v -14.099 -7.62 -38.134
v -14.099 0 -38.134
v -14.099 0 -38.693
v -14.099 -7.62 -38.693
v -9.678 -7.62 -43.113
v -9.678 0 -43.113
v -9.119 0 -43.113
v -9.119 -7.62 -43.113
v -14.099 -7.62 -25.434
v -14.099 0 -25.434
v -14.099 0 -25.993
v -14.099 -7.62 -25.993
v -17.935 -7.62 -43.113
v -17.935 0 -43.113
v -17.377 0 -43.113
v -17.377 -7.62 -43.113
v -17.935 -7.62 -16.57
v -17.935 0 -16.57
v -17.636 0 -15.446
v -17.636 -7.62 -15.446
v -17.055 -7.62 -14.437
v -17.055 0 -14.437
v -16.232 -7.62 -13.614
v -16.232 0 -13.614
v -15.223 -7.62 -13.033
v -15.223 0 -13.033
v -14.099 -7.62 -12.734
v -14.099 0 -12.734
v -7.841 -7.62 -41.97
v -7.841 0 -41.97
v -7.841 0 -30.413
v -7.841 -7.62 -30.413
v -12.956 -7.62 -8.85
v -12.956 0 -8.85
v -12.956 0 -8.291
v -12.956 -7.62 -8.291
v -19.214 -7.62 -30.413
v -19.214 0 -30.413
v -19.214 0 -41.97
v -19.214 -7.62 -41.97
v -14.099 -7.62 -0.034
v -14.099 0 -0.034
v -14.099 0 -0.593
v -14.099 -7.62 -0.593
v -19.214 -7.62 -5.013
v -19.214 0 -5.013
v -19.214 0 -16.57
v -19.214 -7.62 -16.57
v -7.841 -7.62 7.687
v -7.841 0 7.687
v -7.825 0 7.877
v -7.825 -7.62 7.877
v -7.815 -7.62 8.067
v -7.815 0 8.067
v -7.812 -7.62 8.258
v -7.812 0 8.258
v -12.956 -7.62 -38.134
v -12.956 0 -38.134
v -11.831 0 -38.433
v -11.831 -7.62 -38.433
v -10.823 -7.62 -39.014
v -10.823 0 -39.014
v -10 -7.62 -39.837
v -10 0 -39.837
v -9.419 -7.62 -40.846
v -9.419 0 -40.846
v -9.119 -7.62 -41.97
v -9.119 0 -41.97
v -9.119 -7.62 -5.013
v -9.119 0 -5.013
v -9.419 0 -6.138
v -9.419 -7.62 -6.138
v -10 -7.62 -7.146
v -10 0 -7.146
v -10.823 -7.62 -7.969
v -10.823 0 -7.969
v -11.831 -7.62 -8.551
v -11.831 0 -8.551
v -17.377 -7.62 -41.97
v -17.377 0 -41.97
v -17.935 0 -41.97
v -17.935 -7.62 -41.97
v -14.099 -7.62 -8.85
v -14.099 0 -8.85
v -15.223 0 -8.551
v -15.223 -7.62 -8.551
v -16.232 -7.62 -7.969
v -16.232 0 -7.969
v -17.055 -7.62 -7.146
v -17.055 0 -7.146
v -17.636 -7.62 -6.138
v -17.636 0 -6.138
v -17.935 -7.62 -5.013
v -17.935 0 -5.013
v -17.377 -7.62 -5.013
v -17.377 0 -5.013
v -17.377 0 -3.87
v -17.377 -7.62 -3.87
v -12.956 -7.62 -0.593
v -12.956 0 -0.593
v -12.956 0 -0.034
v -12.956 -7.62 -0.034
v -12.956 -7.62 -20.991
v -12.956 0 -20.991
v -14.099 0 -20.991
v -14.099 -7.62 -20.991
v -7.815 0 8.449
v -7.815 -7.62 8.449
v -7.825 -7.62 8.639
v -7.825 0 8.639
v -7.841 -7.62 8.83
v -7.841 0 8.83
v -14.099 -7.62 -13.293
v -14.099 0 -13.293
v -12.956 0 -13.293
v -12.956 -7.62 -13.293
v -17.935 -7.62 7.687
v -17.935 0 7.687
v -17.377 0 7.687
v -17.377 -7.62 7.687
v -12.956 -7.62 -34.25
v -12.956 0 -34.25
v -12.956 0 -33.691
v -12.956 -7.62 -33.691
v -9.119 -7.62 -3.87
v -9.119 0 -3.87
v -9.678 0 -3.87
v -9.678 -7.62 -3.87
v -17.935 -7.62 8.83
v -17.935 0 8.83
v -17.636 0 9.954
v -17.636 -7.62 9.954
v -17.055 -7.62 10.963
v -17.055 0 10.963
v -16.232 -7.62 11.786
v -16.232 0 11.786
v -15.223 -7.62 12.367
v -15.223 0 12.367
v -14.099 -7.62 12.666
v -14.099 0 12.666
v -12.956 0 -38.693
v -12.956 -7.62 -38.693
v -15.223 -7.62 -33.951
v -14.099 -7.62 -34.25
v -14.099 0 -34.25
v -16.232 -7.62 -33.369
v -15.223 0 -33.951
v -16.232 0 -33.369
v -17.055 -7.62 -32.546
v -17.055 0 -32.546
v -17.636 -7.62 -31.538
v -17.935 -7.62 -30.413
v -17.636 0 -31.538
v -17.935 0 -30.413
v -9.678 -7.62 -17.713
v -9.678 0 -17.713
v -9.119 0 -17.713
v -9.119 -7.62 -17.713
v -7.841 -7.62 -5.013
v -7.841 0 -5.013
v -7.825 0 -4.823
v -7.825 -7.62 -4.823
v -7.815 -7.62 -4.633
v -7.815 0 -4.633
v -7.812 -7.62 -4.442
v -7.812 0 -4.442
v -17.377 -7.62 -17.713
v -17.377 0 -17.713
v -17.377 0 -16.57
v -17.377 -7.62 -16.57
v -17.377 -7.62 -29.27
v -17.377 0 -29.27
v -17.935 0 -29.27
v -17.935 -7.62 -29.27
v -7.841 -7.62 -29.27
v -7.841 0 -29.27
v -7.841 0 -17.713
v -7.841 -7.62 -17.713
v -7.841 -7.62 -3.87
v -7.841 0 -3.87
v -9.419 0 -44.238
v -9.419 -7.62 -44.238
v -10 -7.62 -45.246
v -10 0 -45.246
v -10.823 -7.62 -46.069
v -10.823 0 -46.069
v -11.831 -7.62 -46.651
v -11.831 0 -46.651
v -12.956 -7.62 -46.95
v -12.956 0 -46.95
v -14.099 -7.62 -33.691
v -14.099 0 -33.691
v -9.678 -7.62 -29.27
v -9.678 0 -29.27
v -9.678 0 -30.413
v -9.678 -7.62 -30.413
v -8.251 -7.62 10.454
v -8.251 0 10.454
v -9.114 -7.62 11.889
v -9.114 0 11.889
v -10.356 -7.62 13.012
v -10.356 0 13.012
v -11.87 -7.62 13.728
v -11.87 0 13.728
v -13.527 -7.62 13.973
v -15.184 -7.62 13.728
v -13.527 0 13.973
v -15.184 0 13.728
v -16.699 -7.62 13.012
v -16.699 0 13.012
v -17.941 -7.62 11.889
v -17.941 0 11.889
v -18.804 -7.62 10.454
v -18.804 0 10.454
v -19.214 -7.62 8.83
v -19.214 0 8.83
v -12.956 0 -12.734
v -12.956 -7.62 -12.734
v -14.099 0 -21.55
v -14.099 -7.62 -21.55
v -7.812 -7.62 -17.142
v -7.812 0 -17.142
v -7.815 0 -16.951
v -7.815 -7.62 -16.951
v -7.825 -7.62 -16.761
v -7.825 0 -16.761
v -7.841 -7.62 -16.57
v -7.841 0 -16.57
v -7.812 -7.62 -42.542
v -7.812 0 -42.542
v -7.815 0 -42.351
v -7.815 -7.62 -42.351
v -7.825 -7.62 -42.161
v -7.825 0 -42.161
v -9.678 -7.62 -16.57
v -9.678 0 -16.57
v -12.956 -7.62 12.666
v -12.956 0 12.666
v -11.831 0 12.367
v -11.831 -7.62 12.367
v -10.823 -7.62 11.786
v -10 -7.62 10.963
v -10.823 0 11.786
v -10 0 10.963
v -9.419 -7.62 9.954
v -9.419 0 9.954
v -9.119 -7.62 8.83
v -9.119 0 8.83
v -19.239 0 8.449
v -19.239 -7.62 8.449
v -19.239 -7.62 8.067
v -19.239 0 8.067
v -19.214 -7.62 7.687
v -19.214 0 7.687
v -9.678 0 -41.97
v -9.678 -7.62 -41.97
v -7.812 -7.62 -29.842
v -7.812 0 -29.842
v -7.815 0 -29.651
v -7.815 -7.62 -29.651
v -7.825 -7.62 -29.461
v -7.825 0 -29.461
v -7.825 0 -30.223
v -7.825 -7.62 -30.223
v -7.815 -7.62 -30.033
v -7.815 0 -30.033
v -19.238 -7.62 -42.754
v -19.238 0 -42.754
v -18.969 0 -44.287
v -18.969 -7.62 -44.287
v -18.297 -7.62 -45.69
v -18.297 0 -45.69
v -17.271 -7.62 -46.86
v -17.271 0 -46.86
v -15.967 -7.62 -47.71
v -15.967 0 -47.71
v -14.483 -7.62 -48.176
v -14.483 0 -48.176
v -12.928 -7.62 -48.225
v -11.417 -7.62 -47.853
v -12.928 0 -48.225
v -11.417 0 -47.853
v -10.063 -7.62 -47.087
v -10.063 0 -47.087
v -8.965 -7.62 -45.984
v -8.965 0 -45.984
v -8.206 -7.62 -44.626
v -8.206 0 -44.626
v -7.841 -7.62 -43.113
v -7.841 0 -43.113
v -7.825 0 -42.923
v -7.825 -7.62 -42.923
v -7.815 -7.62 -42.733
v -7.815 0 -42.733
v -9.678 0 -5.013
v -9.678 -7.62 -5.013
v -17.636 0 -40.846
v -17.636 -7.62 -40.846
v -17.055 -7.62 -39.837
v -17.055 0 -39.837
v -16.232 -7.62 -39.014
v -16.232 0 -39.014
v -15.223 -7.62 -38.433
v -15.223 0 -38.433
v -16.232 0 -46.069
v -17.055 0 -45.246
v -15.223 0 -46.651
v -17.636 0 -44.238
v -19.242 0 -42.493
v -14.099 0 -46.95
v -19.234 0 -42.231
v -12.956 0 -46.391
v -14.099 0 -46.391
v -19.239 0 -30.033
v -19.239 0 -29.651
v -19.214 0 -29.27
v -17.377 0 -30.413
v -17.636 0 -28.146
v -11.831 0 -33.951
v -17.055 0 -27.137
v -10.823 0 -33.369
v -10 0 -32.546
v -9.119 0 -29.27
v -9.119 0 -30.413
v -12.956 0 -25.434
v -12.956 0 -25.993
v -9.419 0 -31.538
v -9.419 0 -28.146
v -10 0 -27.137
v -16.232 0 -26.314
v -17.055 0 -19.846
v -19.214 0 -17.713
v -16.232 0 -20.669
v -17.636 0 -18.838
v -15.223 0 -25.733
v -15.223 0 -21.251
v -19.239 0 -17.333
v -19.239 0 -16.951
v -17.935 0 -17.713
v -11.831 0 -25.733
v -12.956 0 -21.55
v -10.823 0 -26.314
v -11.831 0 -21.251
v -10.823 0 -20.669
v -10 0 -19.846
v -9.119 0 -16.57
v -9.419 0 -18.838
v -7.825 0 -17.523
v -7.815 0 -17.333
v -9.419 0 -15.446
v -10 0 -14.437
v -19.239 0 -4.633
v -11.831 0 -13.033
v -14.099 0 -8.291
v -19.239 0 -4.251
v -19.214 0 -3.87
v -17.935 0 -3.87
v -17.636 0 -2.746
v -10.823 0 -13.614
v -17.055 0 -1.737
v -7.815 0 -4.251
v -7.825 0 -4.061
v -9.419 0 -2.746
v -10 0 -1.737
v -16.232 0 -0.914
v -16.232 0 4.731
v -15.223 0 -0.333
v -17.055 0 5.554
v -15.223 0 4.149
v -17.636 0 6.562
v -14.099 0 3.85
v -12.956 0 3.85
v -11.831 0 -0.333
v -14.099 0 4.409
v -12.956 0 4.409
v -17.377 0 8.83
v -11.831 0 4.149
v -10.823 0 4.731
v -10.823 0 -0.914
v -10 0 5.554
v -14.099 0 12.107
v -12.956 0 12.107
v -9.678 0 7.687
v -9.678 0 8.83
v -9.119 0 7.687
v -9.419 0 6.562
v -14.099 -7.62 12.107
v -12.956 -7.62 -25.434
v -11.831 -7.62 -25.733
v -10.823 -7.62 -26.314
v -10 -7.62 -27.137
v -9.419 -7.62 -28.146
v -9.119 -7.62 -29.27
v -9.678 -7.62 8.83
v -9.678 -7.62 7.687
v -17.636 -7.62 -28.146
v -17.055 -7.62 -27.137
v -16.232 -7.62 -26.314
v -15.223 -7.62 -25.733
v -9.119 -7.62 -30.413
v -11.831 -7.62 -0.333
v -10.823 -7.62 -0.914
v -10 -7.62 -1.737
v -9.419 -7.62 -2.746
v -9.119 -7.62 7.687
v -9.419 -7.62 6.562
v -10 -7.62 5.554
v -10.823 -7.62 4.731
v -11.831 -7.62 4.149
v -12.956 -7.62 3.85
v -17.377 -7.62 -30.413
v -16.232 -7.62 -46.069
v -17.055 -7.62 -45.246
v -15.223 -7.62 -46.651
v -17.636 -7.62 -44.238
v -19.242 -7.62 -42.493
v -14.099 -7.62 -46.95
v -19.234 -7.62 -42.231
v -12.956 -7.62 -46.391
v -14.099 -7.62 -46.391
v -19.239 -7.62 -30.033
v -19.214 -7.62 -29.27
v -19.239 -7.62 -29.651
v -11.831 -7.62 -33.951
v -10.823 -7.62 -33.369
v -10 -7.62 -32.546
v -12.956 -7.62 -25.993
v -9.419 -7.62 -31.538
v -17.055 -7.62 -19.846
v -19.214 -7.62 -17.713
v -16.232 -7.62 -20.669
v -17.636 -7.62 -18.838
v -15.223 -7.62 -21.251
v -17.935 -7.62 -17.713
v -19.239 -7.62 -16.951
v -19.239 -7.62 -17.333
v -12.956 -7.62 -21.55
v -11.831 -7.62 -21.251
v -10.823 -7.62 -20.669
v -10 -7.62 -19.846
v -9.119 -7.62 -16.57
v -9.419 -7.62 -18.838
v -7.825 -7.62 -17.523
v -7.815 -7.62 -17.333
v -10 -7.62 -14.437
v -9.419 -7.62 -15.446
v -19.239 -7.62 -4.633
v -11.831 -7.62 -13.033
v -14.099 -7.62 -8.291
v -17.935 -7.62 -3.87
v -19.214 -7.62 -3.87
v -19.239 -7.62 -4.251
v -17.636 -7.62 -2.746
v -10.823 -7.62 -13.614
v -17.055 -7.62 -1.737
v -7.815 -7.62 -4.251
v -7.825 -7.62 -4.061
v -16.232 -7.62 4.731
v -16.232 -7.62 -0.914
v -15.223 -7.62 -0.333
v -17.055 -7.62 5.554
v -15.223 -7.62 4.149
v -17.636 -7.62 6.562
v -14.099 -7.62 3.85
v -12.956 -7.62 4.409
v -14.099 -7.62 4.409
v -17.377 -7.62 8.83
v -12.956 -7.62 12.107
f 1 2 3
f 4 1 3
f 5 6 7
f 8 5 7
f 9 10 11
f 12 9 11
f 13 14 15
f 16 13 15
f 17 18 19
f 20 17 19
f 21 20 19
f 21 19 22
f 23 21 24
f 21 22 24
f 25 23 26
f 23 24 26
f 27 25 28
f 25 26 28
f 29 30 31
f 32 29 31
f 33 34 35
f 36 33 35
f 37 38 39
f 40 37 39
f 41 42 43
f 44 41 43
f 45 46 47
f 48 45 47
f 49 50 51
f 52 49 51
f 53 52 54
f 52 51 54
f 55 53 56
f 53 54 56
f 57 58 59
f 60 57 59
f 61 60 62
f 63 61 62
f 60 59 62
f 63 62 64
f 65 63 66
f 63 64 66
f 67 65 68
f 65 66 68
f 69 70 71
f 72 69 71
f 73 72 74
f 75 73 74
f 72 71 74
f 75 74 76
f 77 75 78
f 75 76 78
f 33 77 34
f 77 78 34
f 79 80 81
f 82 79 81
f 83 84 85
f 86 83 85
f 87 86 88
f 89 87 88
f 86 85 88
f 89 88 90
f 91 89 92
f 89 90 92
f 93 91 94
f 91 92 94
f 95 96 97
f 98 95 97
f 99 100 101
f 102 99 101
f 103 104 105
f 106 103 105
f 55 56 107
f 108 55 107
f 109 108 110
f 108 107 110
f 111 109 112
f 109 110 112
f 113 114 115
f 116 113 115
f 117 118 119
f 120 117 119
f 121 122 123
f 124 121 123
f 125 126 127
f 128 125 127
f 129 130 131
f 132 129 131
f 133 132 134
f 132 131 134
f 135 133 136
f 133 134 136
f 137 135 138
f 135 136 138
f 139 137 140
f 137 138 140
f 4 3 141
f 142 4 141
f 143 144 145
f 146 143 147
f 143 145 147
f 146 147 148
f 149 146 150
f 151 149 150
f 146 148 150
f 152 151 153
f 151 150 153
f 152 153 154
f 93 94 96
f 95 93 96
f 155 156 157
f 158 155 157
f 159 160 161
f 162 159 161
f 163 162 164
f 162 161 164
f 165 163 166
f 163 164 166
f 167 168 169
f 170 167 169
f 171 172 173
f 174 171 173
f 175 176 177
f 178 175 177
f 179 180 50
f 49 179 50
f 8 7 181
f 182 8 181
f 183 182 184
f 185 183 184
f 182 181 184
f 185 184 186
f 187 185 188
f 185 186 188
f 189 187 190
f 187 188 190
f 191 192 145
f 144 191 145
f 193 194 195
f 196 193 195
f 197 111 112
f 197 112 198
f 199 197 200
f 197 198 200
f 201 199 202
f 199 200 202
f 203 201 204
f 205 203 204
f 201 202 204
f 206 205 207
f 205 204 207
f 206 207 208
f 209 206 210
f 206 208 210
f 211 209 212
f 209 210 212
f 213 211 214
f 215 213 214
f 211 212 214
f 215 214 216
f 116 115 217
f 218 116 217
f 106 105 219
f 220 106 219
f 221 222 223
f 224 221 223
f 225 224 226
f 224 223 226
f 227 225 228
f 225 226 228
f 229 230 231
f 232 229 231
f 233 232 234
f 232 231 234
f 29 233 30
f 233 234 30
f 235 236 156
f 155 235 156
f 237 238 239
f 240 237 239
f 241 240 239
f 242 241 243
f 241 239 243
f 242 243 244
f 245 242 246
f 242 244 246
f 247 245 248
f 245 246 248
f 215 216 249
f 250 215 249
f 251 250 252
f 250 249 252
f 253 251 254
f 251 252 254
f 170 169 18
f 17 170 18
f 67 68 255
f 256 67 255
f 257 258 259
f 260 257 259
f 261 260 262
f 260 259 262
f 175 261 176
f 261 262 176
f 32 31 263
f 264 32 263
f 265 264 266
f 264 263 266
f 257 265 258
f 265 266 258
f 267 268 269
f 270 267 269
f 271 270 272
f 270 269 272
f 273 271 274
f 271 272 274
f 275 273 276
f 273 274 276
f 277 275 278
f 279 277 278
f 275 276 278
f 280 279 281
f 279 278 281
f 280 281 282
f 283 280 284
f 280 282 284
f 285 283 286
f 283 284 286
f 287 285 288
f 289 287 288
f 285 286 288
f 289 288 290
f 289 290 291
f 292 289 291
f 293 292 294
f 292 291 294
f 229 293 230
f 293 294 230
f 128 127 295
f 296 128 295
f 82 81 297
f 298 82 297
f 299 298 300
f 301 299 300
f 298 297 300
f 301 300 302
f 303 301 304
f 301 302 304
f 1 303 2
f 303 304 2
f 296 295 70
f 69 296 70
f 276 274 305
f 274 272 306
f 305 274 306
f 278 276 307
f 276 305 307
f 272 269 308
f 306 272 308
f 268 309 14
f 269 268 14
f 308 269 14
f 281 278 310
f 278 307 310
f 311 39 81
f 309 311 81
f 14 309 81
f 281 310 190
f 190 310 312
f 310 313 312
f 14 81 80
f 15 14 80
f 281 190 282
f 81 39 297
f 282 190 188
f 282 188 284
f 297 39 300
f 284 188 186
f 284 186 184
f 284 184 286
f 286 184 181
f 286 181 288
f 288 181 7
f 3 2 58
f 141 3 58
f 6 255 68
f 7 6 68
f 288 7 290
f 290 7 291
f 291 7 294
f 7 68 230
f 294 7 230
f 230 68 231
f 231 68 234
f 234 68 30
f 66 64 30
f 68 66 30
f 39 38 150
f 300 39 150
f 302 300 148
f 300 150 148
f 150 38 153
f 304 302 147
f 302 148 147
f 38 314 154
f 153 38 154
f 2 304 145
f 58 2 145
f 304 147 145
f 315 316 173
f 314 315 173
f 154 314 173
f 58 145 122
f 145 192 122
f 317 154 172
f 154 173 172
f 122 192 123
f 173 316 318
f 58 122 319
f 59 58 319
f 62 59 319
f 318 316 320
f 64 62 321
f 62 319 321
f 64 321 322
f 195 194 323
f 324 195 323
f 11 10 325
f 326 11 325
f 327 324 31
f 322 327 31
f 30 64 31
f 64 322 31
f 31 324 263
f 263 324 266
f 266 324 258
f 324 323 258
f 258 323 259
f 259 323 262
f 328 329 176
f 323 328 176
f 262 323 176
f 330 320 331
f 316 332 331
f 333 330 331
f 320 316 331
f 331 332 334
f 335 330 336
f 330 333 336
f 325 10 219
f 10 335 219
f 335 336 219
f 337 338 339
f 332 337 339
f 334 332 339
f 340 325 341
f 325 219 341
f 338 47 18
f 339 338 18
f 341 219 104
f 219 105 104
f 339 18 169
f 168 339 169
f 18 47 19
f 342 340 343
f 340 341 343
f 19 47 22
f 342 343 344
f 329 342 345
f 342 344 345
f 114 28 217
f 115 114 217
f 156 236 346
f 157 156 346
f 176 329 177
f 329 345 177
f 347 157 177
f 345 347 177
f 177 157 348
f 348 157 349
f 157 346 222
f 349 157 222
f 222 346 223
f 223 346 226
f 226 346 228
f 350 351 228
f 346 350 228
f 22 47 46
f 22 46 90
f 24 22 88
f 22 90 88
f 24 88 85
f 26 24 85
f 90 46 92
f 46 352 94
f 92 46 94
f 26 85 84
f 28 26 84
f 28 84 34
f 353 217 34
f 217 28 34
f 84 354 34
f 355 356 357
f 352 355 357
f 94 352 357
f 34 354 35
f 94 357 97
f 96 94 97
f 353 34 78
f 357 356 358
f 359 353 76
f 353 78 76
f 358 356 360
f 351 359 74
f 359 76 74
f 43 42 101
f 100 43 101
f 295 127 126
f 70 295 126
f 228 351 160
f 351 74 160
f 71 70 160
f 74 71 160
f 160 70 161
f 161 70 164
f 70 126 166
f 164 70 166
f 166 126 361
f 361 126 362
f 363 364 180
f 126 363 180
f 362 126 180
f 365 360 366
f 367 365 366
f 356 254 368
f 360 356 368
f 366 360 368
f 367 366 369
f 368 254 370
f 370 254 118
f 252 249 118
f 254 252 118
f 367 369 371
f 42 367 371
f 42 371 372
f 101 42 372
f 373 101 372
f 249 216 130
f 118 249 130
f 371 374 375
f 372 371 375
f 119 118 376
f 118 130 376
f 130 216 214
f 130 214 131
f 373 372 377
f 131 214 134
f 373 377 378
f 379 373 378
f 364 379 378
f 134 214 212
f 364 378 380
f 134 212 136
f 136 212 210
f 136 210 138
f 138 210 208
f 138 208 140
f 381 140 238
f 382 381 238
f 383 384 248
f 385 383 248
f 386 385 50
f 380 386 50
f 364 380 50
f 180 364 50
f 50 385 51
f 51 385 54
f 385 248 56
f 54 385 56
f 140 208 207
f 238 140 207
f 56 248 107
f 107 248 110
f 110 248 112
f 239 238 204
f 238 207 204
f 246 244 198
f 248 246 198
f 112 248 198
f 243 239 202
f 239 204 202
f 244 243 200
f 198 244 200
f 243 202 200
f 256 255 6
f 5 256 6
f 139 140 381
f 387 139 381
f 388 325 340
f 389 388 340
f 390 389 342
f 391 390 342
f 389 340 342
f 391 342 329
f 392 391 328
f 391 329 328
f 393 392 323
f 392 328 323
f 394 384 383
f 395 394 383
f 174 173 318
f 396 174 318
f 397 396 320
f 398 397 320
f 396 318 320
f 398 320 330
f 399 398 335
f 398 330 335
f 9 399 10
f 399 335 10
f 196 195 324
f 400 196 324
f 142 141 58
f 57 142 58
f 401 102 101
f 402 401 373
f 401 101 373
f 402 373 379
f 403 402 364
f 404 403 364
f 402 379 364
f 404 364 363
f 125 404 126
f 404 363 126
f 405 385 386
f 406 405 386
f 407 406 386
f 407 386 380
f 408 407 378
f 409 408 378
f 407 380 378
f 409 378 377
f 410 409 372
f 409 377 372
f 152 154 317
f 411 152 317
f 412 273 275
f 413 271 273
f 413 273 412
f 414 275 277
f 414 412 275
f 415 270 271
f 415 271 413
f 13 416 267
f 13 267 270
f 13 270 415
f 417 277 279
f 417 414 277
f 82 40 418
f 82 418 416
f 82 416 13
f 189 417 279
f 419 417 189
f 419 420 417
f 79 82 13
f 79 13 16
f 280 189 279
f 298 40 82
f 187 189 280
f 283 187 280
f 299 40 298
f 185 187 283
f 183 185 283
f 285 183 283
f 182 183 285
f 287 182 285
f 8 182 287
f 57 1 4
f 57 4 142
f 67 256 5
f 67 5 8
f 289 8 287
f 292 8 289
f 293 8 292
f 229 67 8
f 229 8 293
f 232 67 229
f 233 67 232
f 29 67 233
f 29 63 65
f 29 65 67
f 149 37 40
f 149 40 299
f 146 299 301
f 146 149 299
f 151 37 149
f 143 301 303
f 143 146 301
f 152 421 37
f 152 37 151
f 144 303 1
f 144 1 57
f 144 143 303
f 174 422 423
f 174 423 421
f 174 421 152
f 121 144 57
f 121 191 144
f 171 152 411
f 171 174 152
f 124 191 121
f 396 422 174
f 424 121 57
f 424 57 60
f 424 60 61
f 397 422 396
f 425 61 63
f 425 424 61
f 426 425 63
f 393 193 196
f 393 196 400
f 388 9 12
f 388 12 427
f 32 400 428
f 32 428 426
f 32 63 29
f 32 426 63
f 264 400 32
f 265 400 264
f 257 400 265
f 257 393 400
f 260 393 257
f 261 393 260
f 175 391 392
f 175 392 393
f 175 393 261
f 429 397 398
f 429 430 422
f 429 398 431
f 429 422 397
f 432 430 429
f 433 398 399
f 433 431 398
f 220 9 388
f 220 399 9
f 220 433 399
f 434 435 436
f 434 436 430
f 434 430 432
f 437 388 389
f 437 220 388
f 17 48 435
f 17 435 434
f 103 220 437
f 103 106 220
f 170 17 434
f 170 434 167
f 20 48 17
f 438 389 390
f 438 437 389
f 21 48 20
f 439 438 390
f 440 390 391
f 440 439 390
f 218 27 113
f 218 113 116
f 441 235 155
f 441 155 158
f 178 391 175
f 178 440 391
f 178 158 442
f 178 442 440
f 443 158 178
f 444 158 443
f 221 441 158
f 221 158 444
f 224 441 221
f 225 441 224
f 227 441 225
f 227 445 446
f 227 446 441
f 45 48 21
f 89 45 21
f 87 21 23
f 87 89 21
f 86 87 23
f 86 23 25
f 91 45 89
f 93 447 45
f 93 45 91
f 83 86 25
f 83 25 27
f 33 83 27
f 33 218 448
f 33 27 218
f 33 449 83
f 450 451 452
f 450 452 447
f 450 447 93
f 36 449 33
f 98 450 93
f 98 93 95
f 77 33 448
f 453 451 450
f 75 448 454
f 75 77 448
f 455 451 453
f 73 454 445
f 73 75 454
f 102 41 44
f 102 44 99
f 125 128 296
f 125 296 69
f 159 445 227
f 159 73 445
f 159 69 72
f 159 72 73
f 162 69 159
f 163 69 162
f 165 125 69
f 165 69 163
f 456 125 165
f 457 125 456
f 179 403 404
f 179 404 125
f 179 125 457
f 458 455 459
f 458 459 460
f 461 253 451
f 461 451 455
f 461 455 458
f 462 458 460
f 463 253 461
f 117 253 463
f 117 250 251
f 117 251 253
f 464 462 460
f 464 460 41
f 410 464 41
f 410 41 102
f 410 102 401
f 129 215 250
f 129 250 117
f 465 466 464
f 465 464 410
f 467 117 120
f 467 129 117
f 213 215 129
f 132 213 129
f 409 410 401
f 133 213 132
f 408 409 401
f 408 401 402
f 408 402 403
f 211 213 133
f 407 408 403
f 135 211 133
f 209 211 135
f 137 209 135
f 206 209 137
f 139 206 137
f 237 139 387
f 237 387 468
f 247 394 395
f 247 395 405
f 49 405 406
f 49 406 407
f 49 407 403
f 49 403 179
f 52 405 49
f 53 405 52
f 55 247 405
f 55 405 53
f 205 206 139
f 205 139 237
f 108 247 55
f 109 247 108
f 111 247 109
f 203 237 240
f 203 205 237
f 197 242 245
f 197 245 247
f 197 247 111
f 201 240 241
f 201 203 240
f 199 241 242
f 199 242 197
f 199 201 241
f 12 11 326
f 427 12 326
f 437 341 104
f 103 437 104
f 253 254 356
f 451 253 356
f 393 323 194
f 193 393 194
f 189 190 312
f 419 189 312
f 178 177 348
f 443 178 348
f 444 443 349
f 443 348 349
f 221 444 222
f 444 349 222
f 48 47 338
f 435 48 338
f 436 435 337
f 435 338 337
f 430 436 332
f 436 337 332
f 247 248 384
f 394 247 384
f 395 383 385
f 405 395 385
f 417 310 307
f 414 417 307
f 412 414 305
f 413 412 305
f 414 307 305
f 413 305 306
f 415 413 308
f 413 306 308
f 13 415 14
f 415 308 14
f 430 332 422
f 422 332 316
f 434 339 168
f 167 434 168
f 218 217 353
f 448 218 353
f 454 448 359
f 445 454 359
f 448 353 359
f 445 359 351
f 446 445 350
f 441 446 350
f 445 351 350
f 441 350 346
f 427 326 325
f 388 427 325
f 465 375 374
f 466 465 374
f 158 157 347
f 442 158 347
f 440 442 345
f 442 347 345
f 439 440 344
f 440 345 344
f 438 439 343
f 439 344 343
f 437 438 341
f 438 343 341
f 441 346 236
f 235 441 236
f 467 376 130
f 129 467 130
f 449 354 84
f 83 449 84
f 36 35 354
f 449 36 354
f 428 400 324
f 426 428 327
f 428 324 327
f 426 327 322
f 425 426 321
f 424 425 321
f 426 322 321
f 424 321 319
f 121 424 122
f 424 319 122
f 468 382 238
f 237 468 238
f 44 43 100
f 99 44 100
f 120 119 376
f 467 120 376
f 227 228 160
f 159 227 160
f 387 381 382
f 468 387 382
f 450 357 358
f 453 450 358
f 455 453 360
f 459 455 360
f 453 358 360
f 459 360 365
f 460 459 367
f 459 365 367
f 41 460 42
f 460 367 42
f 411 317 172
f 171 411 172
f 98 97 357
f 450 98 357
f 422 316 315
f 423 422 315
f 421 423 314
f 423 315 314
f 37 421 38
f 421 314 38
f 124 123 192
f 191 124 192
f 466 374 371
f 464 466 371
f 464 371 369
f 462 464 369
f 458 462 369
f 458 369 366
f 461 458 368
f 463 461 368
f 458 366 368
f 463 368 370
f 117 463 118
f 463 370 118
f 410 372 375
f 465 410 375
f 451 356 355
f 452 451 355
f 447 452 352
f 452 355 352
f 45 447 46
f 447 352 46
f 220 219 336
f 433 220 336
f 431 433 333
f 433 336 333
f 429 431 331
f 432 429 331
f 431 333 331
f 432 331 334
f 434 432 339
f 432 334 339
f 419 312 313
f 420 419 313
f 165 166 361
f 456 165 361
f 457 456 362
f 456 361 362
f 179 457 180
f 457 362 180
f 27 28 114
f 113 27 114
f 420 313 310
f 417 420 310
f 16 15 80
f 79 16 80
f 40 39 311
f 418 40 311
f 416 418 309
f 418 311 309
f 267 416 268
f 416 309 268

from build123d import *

# Parameters (mm, degrees)
F1_DEPTH = 7.62


with BuildPart() as f1:
    # F0 (on Front) → F1 (new body)
    with BuildSketch(Plane.XZ):
        with BuildLine():
            Line((-7.840858501, -16.5704088648), (-7.840858501, -5.0134088648))
            ThreePointArc((-7.840858501, -5.0134088648), (-13.5272117041, -10.1569088648), (-19.2135649071, -5.0134088648))
            Line((-19.2135649071, -5.0134088648), (-19.2135649071, -16.5704088648))
            ThreePointArc((-19.2135649071, -16.5704088648), (-13.5272117041, -11.4269088648), (-7.840858501, -16.5704088648))
        make_face()
        with BuildLine():
            Line((-7.840858501, -5.0134088648), (-7.840858501, -3.8704088648))
            ThreePointArc((-7.840858501, -3.8704088648), (-13.5272117041, 1.2730911352), (-19.2135649071, -3.8704088648))
            Line((-19.2135649071, -3.8704088648), (-19.2135649071, -5.0134088648))
            ThreePointArc((-19.2135649071, -5.0134088648), (-13.5272117041, -10.1569088648), (-7.840858501, -5.0134088648))
        make_face()
        with BuildLine():
            ThreePointArc((-9.1191040886, -3.8704088648), (-9.0914443888, -4.1555640997), (-9.0822117041, -4.4419088648))
            ThreePointArc((-9.0822117041, -4.4419088648), (-9.0914443888, -4.7282536299), (-9.1191040886, -5.0134088648))
            ThreePointArc((-9.1191040886, -5.0134088648), (-10.3841220617, -7.5849985072), (-12.9557117041, -8.8500164803))
            ThreePointArc((-12.9557117041, -8.8500164803), (-13.5272117041, -8.8869088648), (-14.0987117041, -8.8500164803))
            ThreePointArc((-14.0987117041, -8.8500164803), (-16.6703013465, -7.5849985072), (-17.9353193196, -5.0134088648))
            ThreePointArc((-17.9353193196, -5.0134088648), (-17.9722117041, -4.4419088648), (-17.9353193196, -3.8704088648))
            ThreePointArc((-17.9353193196, -3.8704088648), (-16.6703013465, -1.2988192224), (-14.0987117041, -0.0338012493))
            ThreePointArc((-14.0987117041, -0.0338012493), (-13.5272117041, 0.0030911352), (-12.9557117041, -0.0338012493))
            ThreePointArc((-12.9557117041, -0.0338012493), (-10.3841220617, -1.2988192224), (-9.1191040886, -3.8704088648))
        make_face(mode=Mode.SUBTRACT)
        with BuildLine():
            Line((-7.840858501, -41.9704088648), (-7.840858501, -30.4134088648))
            ThreePointArc((-7.840858501, -30.4134088648), (-13.5272117041, -35.5569088648), (-19.2135649071, -30.4134088648))
            Line((-19.2135649071, -30.4134088648), (-19.2135649071, -41.9704088648))
            ThreePointArc((-19.2135649071, -41.9704088648), (-13.5272117041, -36.8269088648), (-7.840858501, -41.9704088648))
        make_face()
        with BuildLine():
            Line((-7.840858501, -30.4134088648), (-7.840858501, -29.2704088648))
            ThreePointArc((-7.840858501, -29.2704088648), (-13.5272117041, -24.1269088648), (-19.2135649071, -29.2704088648))
            Line((-19.2135649071, -29.2704088648), (-19.2135649071, -30.4134088648))
            ThreePointArc((-19.2135649071, -30.4134088648), (-13.5272117041, -35.5569088648), (-7.840858501, -30.4134088648))
        make_face()
        with BuildLine():
            ThreePointArc((-9.1191040886, -29.2704088648), (-9.0914443888, -29.5555640997), (-9.0822117041, -29.8419088648))
            ThreePointArc((-9.0822117041, -29.8419088648), (-9.0914443888, -30.1282536299), (-9.1191040886, -30.4134088648))
            ThreePointArc((-9.1191040886, -30.4134088648), (-10.3841220617, -32.9849985072), (-12.9557117041, -34.2500164803))
            ThreePointArc((-12.9557117041, -34.2500164803), (-13.5272117041, -34.2869088648), (-14.0987117041, -34.2500164803))
            ThreePointArc((-14.0987117041, -34.2500164803), (-16.6703013465, -32.9849985072), (-17.9353193196, -30.4134088648))
            ThreePointArc((-17.9353193196, -30.4134088648), (-17.9722117041, -29.8419088648), (-17.9353193196, -29.2704088648))
            ThreePointArc((-17.9353193196, -29.2704088648), (-16.6703013465, -26.6988192224), (-14.0987117041, -25.4338012493))
            ThreePointArc((-14.0987117041, -25.4338012493), (-13.5272117041, -25.3969088648), (-12.9557117041, -25.4338012493))
            ThreePointArc((-12.9557117041, -25.4338012493), (-10.3841220617, -26.6988192224), (-9.1191040886, -29.2704088648))
        make_face(mode=Mode.SUBTRACT)
        with BuildLine():
            Line((-7.840858501, -3.8704088648), (-7.840858501, 7.6865911352))
            ThreePointArc((-7.840858501, 7.6865911352), (-13.5272117041, 2.5430911352), (-19.2135649071, 7.6865911352))
            Line((-19.2135649071, 7.6865911352), (-19.2135649071, -3.8704088648))
            ThreePointArc((-19.2135649071, -3.8704088648), (-13.5272117041, 1.2730911352), (-7.840858501, -3.8704088648))
        make_face()
        with BuildLine():
            Line((-7.840858501, -29.2704088648), (-7.840858501, -17.7134088648))
            ThreePointArc((-7.840858501, -17.7134088648), (-13.5272117041, -22.8569088648), (-19.2135649071, -17.7134088648))
            Line((-19.2135649071, -17.7134088648), (-19.2135649071, -29.2704088648))
            ThreePointArc((-19.2135649071, -29.2704088648), (-13.5272117041, -24.1269088648), (-7.840858501, -29.2704088648))
        make_face()
        with BuildLine():
            Line((-7.840858501, -17.7134088648), (-7.840858501, -16.5704088648))
            ThreePointArc((-7.840858501, -16.5704088648), (-13.5272117041, -11.4269088648), (-19.2135649071, -16.5704088648))
            Line((-19.2135649071, -16.5704088648), (-19.2135649071, -17.7134088648))
            ThreePointArc((-19.2135649071, -17.7134088648), (-13.5272117041, -22.8569088648), (-7.840858501, -17.7134088648))
        make_face()
        with BuildLine():
            ThreePointArc((-9.1191040886, -16.5704088648), (-9.0914443888, -16.8555640997), (-9.0822117041, -17.1419088648))
            ThreePointArc((-9.0822117041, -17.1419088648), (-9.0914443888, -17.4282536299), (-9.1191040886, -17.7134088648))
            ThreePointArc((-9.1191040886, -17.7134088648), (-10.3841220617, -20.2849985072), (-12.9557117041, -21.5500164803))
            ThreePointArc((-12.9557117041, -21.5500164803), (-13.5272117041, -21.5869088648), (-14.0987117041, -21.5500164803))
            ThreePointArc((-14.0987117041, -21.5500164803), (-16.6703013465, -20.2849985072), (-17.9353193196, -17.7134088648))
            ThreePointArc((-17.9353193196, -17.7134088648), (-17.9722117041, -17.1419088648), (-17.9353193196, -16.5704088648))
            ThreePointArc((-17.9353193196, -16.5704088648), (-16.6703013465, -13.9988192224), (-14.0987117041, -12.7338012493))
            ThreePointArc((-14.0987117041, -12.7338012493), (-13.5272117041, -12.6969088648), (-12.9557117041, -12.7338012493))
            ThreePointArc((-12.9557117041, -12.7338012493), (-10.3841220617, -13.9988192224), (-9.1191040886, -16.5704088648))
        make_face(mode=Mode.SUBTRACT)
        with BuildLine():
            Line((-7.840858501, 7.6865911352), (-7.840858501, 8.8295911352))
            ThreePointArc((-7.840858501, 8.8295911352), (-13.5272117041, 13.9730911352), (-19.2135649071, 8.8295911352))
            Line((-19.2135649071, 8.8295911352), (-19.2135649071, 7.6865911352))
            ThreePointArc((-19.2135649071, 7.6865911352), (-13.5272117041, 2.5430911352), (-7.840858501, 7.6865911352))
        make_face()
        with BuildLine():
            ThreePointArc((-9.1191040886, 8.8295911352), (-9.0914443888, 8.5444359003), (-9.0822117041, 8.2580911352))
            ThreePointArc((-9.0822117041, 8.2580911352), (-9.0914443888, 7.9717463701), (-9.1191040886, 7.6865911352))
            ThreePointArc((-9.1191040886, 7.6865911352), (-10.3841220617, 5.1150014928), (-12.9557117041, 3.8499835197))
            ThreePointArc((-12.9557117041, 3.8499835197), (-13.5272117041, 3.8130911352), (-14.0987117041, 3.8499835197))
            ThreePointArc((-14.0987117041, 3.8499835197), (-16.6703013465, 5.1150014928), (-17.9353193196, 7.6865911352))
            ThreePointArc((-17.9353193196, 7.6865911352), (-17.9722117041, 8.2580911352), (-17.9353193196, 8.8295911352))
            ThreePointArc((-17.9353193196, 8.8295911352), (-16.6703013465, 11.4011807776), (-14.0987117041, 12.6661987507))
            ThreePointArc((-14.0987117041, 12.6661987507), (-13.5272117041, 12.7030911352), (-12.9557117041, 12.6661987507))
            ThreePointArc((-12.9557117041, 12.6661987507), (-10.3841220617, 11.4011807776), (-9.1191040886, 8.8295911352))
        make_face(mode=Mode.SUBTRACT)
        with BuildLine():
            Line((-7.840858501, -43.1134088648), (-7.840858501, -41.9704088648))
            ThreePointArc((-7.840858501, -41.9704088648), (-13.5272117041, -36.8269088648), (-19.2135649071, -41.9704088648))
            Line((-19.2135649071, -41.9704088648), (-19.2135649071, -42.5419088648))
            Line((-19.2135649071, -42.5419088648), (-19.238257097, -42.7544777244))
            ThreePointArc((-19.238257097, -42.7544777244), (-13.7071014396, -48.2540769894), (-7.840858501, -43.1134088648))
        make_face()
        with BuildLine():
            ThreePointArc((-9.1191040886, -41.9704088648), (-9.0914443888, -42.2555640997), (-9.0822117041, -42.5419088648))
            ThreePointArc((-9.0822117041, -42.5419088648), (-9.0914443888, -42.8282536299), (-9.1191040886, -43.1134088648))
            ThreePointArc((-9.1191040886, -43.1134088648), (-10.3841220617, -45.6849985072), (-12.9557117041, -46.9500164803))
            ThreePointArc((-12.9557117041, -46.9500164803), (-13.5272117041, -46.9869088648), (-14.0987117041, -46.9500164803))
            ThreePointArc((-14.0987117041, -46.9500164803), (-16.6703013465, -45.6849985072), (-17.9353193196, -43.1134088648))
            ThreePointArc((-17.9353193196, -43.1134088648), (-17.9722117041, -42.5419088648), (-17.9353193196, -41.9704088648))
            ThreePointArc((-17.9353193196, -41.9704088648), (-16.6703013465, -39.3988192224), (-14.0987117041, -38.1338012493))
            ThreePointArc((-14.0987117041, -38.1338012493), (-13.5272117041, -38.0969088648), (-12.9557117041, -38.1338012493))
            ThreePointArc((-12.9557117041, -38.1338012493), (-10.3841220617, -39.3988192224), (-9.1191040886, -41.9704088648))
        make_face(mode=Mode.SUBTRACT)
        with BuildLine():
            Line((-12.9557117041, -25.9926012493), (-12.9557117041, -25.4338012493))
            ThreePointArc((-12.9557117041, -25.4338012493), (-13.5272117041, -25.3969088648), (-14.0987117041, -25.4338012493))
            Line((-14.0987117041, -25.4338012493), (-14.0987117041, -25.9926012493))
            Line((-14.0987117041, -25.9926012493), (-12.9557117041, -25.9926012493))
        make_face()
        with BuildLine():
            Line((-19.2135649071, 7.6865911352), (-19.2135649071, 8.8295911352))
            ThreePointArc((-19.2135649071, 8.8295911352), (-19.2422117041, 8.2580911352), (-19.2135649071, 7.6865911352))
        make_face()
        with BuildLine():
            ThreePointArc((-7.840858501, 7.6865911352), (-7.8193778963, 7.9719823757), (-7.8122117041, 8.2580911352))
            ThreePointArc((-7.8122117041, 8.2580911352), (-7.8193778963, 8.5441998947), (-7.840858501, 8.8295911352))
            Line((-7.840858501, 8.8295911352), (-7.840858501, 7.6865911352))
        make_face()
        with BuildLine():
            Line((-19.2135649071, -5.0134088648), (-19.2135649071, -3.8704088648))
            ThreePointArc((-19.2135649071, -3.8704088648), (-19.2422117041, -4.4419088648), (-19.2135649071, -5.0134088648))
        make_face()
        with BuildLine():
            ThreePointArc((-7.8122117041, -17.1419088648), (-7.8193778963, -16.8558001053), (-7.840858501, -16.5704088648))
            Line((-7.840858501, -16.5704088648), (-7.840858501, -17.7134088648))
            ThreePointArc((-7.840858501, -17.7134088648), (-7.8193778963, -17.4280176243), (-7.8122117041, -17.1419088648))
        make_face()
        with BuildLine():
            ThreePointArc((-7.8122117041, -42.5419088648), (-7.8193778963, -42.2558001053), (-7.840858501, -41.9704088648))
            Line((-7.840858501, -41.9704088648), (-7.840858501, -43.1134088648))
            ThreePointArc((-7.840858501, -43.1134088648), (-7.8193778963, -42.8280176243), (-7.8122117041, -42.5419088648))
        make_face()
        with BuildLine():
            Line((-12.9557117041, -13.2926012493), (-12.9557117041, -12.7338012493))
            ThreePointArc((-12.9557117041, -12.7338012493), (-13.5272117041, -12.6969088648), (-14.0987117041, -12.7338012493))
            Line((-14.0987117041, -12.7338012493), (-14.0987117041, -13.2926012493))
            Line((-14.0987117041, -13.2926012493), (-12.9557117041, -13.2926012493))
        make_face()
        with BuildLine():
            Line((-12.9557117041, -0.5926012493), (-12.9557117041, -0.0338012493))
            ThreePointArc((-12.9557117041, -0.0338012493), (-13.5272117041, 0.0030911352), (-14.0987117041, -0.0338012493))
            Line((-14.0987117041, -0.0338012493), (-14.0987117041, -0.5926012493))
            Line((-14.0987117041, -0.5926012493), (-12.9557117041, -0.5926012493))
        make_face()
        with BuildLine():
            Line((-12.9557117041, -38.6926012493), (-12.9557117041, -38.1338012493))
            ThreePointArc((-12.9557117041, -38.1338012493), (-13.5272117041, -38.0969088648), (-14.0987117041, -38.1338012493))
            Line((-14.0987117041, -38.1338012493), (-14.0987117041, -38.6926012493))
            Line((-14.0987117041, -38.6926012493), (-12.9557117041, -38.6926012493))
        make_face()
        with BuildLine():
            ThreePointArc((-7.8122117041, -4.4419088648), (-7.8193778963, -4.1558001053), (-7.840858501, -3.8704088648))
            Line((-7.840858501, -3.8704088648), (-7.840858501, -5.0134088648))
            ThreePointArc((-7.840858501, -5.0134088648), (-7.8193778963, -4.7280176243), (-7.8122117041, -4.4419088648))
        make_face()
        with BuildLine():
            Line((-19.2135649071, -17.7134088648), (-19.2135649071, -16.5704088648))
            ThreePointArc((-19.2135649071, -16.5704088648), (-19.2422117041, -17.1419088648), (-19.2135649071, -17.7134088648))
        make_face()
        with BuildLine():
            Line((-19.2135649071, -30.4134088648), (-19.2135649071, -29.2704088648))
            ThreePointArc((-19.2135649071, -29.2704088648), (-19.2422117041, -29.8419088648), (-19.2135649071, -30.4134088648))
        make_face()
        with BuildLine():
            ThreePointArc((-7.8122117041, -29.8419088648), (-7.8193778963, -29.5558001053), (-7.840858501, -29.2704088648))
            Line((-7.840858501, -29.2704088648), (-7.840858501, -30.4134088648))
            ThreePointArc((-7.840858501, -30.4134088648), (-7.8193778963, -30.1280176243), (-7.8122117041, -29.8419088648))
        make_face()
        with BuildLine():
            Line((-12.9557117041, 12.1073987507), (-12.9557117041, 12.6661987507))
            ThreePointArc((-12.9557117041, 12.6661987507), (-13.5272117041, 12.7030911352), (-14.0987117041, 12.6661987507))
            Line((-14.0987117041, 12.6661987507), (-14.0987117041, 12.1073987507))
            Line((-14.0987117041, 12.1073987507), (-12.9557117041, 12.1073987507))
        make_face()
        with BuildLine():
            Line((-19.2135649071, -42.5419088648), (-19.2135649071, -41.9704088648))
            ThreePointArc((-19.2135649071, -41.9704088648), (-19.2393798286, -42.3620191293), (-19.238257097, -42.7544777244))
            Line((-19.238257097, -42.7544777244), (-19.2135649071, -42.5419088648))
        make_face()
        with BuildLine():
            ThreePointArc((-9.1191040886, -30.4134088648), (-9.0914443888, -30.1282536299), (-9.0822117041, -29.8419088648))
            ThreePointArc((-9.0822117041, -29.8419088648), (-9.0914443888, -29.5555640997), (-9.1191040886, -29.2704088648))
            Line((-9.1191040886, -29.2704088648), (-9.6779040886, -29.2704088648))
            Line((-9.6779040886, -29.2704088648), (-9.6779040886, -30.4134088648))
            Line((-9.6779040886, -30.4134088648), (-9.1191040886, -30.4134088648))
        make_face()
        with BuildLine():
            Line((-17.3765193196, -29.2704088648), (-17.9353193196, -29.2704088648))
            ThreePointArc((-17.9353193196, -29.2704088648), (-17.9722117041, -29.8419088648), (-17.9353193196, -30.4134088648))
            Line((-17.9353193196, -30.4134088648), (-17.3765193196, -30.4134088648))
            Line((-17.3765193196, -30.4134088648), (-17.3765193196, -29.2704088648))
        make_face()
        with BuildLine():
            ThreePointArc((-9.1191040886, -5.0134088648), (-9.0914443888, -4.7282536299), (-9.0822117041, -4.4419088648))
            ThreePointArc((-9.0822117041, -4.4419088648), (-9.0914443888, -4.1555640997), (-9.1191040886, -3.8704088648))
            Line((-9.1191040886, -3.8704088648), (-9.6779040886, -3.8704088648))
            Line((-9.6779040886, -3.8704088648), (-9.6779040886, -5.0134088648))
            Line((-9.6779040886, -5.0134088648), (-9.1191040886, -5.0134088648))
        make_face()
        with BuildLine():
            ThreePointArc((-14.0987117041, -21.5500164803), (-13.5272117041, -21.5869088648), (-12.9557117041, -21.5500164803))
            Line((-12.9557117041, -21.5500164803), (-12.9557117041, -20.9912164803))
            Line((-12.9557117041, -20.9912164803), (-14.0987117041, -20.9912164803))
            Line((-14.0987117041, -20.9912164803), (-14.0987117041, -21.5500164803))
        make_face()
        with BuildLine():
            Line((-17.3765193196, -41.9704088648), (-17.9353193196, -41.9704088648))
            ThreePointArc((-17.9353193196, -41.9704088648), (-17.9722117041, -42.5419088648), (-17.9353193196, -43.1134088648))
            Line((-17.9353193196, -43.1134088648), (-17.3765193196, -43.1134088648))
            Line((-17.3765193196, -43.1134088648), (-17.3765193196, -41.9704088648))
        make_face()
        with BuildLine():
            ThreePointArc((-9.1191040886, -17.7134088648), (-9.0914443888, -17.4282536299), (-9.0822117041, -17.1419088648))
            ThreePointArc((-9.0822117041, -17.1419088648), (-9.0914443888, -16.8555640997), (-9.1191040886, -16.5704088648))
            Line((-9.1191040886, -16.5704088648), (-9.6779040886, -16.5704088648))
            Line((-9.6779040886, -16.5704088648), (-9.6779040886, -17.7134088648))
            Line((-9.6779040886, -17.7134088648), (-9.1191040886, -17.7134088648))
        make_face()
        with BuildLine():
            ThreePointArc((-14.0987117041, -46.9500164803), (-13.5272117041, -46.9869088648), (-12.9557117041, -46.9500164803))
            Line((-12.9557117041, -46.9500164803), (-12.9557117041, -46.3912164803))
            Line((-12.9557117041, -46.3912164803), (-14.0987117041, -46.3912164803))
            Line((-14.0987117041, -46.3912164803), (-14.0987117041, -46.9500164803))
        make_face()
        with BuildLine():
            Line((-17.3765193196, -3.8704088648), (-17.9353193196, -3.8704088648))
            ThreePointArc((-17.9353193196, -3.8704088648), (-17.9722117041, -4.4419088648), (-17.9353193196, -5.0134088648))
            Line((-17.9353193196, -5.0134088648), (-17.3765193196, -5.0134088648))
            Line((-17.3765193196, -5.0134088648), (-17.3765193196, -3.8704088648))
        make_face()
        with BuildLine():
            ThreePointArc((-9.1191040886, 7.6865911352), (-9.0914443888, 7.9717463701), (-9.0822117041, 8.2580911352))
            ThreePointArc((-9.0822117041, 8.2580911352), (-9.0914443888, 8.5444359003), (-9.1191040886, 8.8295911352))
            Line((-9.1191040886, 8.8295911352), (-9.6779040886, 8.8295911352))
            Line((-9.6779040886, 8.8295911352), (-9.6779040886, 7.6865911352))
            Line((-9.6779040886, 7.6865911352), (-9.1191040886, 7.6865911352))
        make_face()
        with BuildLine():
            ThreePointArc((-14.0987117041, -8.8500164803), (-13.5272117041, -8.8869088648), (-12.9557117041, -8.8500164803))
            Line((-12.9557117041, -8.8500164803), (-12.9557117041, -8.2912164803))
            Line((-12.9557117041, -8.2912164803), (-14.0987117041, -8.2912164803))
            Line((-14.0987117041, -8.2912164803), (-14.0987117041, -8.8500164803))
        make_face()
        with BuildLine():
            Line((-17.3765193196, -16.5704088648), (-17.9353193196, -16.5704088648))
            ThreePointArc((-17.9353193196, -16.5704088648), (-17.9722117041, -17.1419088648), (-17.9353193196, -17.7134088648))
            Line((-17.9353193196, -17.7134088648), (-17.3765193196, -17.7134088648))
            Line((-17.3765193196, -17.7134088648), (-17.3765193196, -16.5704088648))
        make_face()
        with BuildLine():
            Line((-17.3765193196, 8.8295911352), (-17.9353193196, 8.8295911352))
            ThreePointArc((-17.9353193196, 8.8295911352), (-17.9722117041, 8.2580911352), (-17.9353193196, 7.6865911352))
            Line((-17.9353193196, 7.6865911352), (-17.3765193196, 7.6865911352))
            Line((-17.3765193196, 7.6865911352), (-17.3765193196, 8.8295911352))
        make_face()
        with BuildLine():
            ThreePointArc((-14.0987117041, 3.8499835197), (-13.5272117041, 3.8130911352), (-12.9557117041, 3.8499835197))
            Line((-12.9557117041, 3.8499835197), (-12.9557117041, 4.4087835197))
            Line((-12.9557117041, 4.4087835197), (-14.0987117041, 4.4087835197))
            Line((-14.0987117041, 4.4087835197), (-14.0987117041, 3.8499835197))
        make_face()
        with BuildLine():
            ThreePointArc((-9.1191040886, -43.1134088648), (-9.0914443888, -42.8282536299), (-9.0822117041, -42.5419088648))
            ThreePointArc((-9.0822117041, -42.5419088648), (-9.0914443888, -42.2555640997), (-9.1191040886, -41.9704088648))
            Line((-9.1191040886, -41.9704088648), (-9.6779040886, -41.9704088648))
            Line((-9.6779040886, -41.9704088648), (-9.6779040886, -43.1134088648))
            Line((-9.6779040886, -43.1134088648), (-9.1191040886, -43.1134088648))
        make_face()
        with BuildLine():
            ThreePointArc((-14.0987117041, -34.2500164803), (-13.5272117041, -34.2869088648), (-12.9557117041, -34.2500164803))
            Line((-12.9557117041, -34.2500164803), (-12.9557117041, -33.6912164803))
            Line((-12.9557117041, -33.6912164803), (-14.0987117041, -33.6912164803))
            Line((-14.0987117041, -33.6912164803), (-14.0987117041, -34.2500164803))
        make_face()
    extrude(amount=F1_DEPTH)


solid = f1.part
